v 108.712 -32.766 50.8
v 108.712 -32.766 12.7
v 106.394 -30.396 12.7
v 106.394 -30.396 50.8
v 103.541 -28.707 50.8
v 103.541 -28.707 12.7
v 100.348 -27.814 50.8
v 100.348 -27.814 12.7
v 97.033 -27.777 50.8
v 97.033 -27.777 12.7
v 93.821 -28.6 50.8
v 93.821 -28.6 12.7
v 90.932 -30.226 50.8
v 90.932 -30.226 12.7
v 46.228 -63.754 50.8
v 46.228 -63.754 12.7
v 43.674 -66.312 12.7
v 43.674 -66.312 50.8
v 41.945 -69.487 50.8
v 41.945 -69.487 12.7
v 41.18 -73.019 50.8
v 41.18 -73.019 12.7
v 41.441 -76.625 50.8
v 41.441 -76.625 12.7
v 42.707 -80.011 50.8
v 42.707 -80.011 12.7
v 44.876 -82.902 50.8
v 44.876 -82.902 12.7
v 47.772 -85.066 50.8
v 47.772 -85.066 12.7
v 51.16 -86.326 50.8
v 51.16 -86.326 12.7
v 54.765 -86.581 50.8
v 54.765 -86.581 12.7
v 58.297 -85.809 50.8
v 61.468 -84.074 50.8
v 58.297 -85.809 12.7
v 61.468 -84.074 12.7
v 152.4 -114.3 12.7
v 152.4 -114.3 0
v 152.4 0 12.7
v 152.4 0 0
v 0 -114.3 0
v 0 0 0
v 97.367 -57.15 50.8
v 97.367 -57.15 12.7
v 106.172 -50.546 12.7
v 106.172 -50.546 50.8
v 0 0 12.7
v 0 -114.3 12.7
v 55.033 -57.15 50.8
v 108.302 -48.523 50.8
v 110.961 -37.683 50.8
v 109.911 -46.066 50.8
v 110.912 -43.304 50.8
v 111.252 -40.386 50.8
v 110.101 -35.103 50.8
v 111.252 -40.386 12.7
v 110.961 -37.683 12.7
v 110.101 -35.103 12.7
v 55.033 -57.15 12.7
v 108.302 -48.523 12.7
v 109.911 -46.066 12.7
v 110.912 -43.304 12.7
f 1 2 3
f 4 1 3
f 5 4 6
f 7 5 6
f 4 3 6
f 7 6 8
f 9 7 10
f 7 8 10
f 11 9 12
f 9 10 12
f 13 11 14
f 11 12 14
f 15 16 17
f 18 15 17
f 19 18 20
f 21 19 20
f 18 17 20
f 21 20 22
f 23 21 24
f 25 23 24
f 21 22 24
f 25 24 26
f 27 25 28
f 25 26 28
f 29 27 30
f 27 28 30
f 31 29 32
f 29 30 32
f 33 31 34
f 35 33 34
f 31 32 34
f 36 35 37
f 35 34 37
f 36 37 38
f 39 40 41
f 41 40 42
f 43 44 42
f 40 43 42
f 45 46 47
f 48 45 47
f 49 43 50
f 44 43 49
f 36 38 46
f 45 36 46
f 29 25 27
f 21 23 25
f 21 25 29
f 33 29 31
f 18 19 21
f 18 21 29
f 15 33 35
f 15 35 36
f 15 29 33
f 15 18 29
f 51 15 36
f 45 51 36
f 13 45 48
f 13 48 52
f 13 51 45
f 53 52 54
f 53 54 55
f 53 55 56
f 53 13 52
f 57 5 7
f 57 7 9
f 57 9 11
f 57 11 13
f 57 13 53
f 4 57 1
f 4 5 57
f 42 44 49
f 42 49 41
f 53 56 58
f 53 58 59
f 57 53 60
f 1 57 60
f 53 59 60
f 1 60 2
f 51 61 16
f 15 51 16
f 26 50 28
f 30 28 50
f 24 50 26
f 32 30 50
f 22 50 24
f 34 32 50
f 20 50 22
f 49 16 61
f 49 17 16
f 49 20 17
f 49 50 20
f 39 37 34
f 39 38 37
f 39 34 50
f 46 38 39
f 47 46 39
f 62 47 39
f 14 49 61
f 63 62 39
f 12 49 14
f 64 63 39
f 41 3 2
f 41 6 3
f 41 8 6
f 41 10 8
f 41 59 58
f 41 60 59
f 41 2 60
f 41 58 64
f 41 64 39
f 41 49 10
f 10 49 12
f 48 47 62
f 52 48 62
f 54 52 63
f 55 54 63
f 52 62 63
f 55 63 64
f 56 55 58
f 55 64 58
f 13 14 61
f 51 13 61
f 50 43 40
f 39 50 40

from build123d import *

# Parameters (mm, degrees)
F0_W     = 152.4
F0_H     = 114.3
F1_DEPTH = 12.7
F3_DEPTH = 38.1


with BuildPart() as f1:
    # F0 (on Top) → F1 (new body)
    with BuildSketch(Plane.XY):
        with Locations((76.2, -57.15)):
            Rectangle(F0_W, F0_H)
    extrude(amount=F1_DEPTH)

    # F2 (on face) → F3 (join)
    with BuildSketch(Plane.XY.offset(12.7)):
        Polygon((76.2, -41.275), (55.0333333333, -57.15), (76.2, -57.15), align=None)
        with BuildLine():
            Line((76.2, -57.15), (55.0333333333, -57.15))
            Line((55.0333333333, -57.15), (46.228, -63.754))
            ThreePointArc((46.228, -63.754), (55.6440512242, -61.3416414305), (64.008, -66.294))
            Line((64.008, -66.294), (76.2, -57.15))
        make_face()
        with BuildLine():
            Line((88.392, -48.006), (76.2, -57.15))
            Line((76.2, -57.15), (97.3666666667, -57.15))
            Line((97.3666666667, -57.15), (106.172, -50.546))
            ThreePointArc((106.172, -50.546), (96.7559487758, -52.9583585695), (88.392, -48.006))
        make_face()
        Polygon((97.3666666667, -57.15), (76.2, -57.15), (76.2, -73.025), align=None)
        with BuildLine():
            Line((76.2, -41.275), (76.2, -57.15))
            Line((76.2, -57.15), (88.392, -48.006))
            ThreePointArc((88.392, -48.006), (85.9796414305, -38.5899487758), (90.932, -30.226))
            Line((90.932, -30.226), (76.2, -41.275))
        make_face()
        with BuildLine():
            Line((76.2, -73.025), (76.2, -57.15))
            Line((76.2, -57.15), (64.008, -66.294))
            ThreePointArc((64.008, -66.294), (65.8962778852, -69.8979073716), (66.548, -73.914))
            ThreePointArc((66.548, -73.914), (65.2072253257, -79.5936126628), (61.468, -84.074))
            Line((61.468, -84.074), (76.2, -73.025))
        make_face()
        with BuildLine():
            ThreePointArc((64.008, -66.294), (55.6440512242, -61.3416414305), (46.228, -63.754))
            Line((46.228, -63.754), (53.848, -73.914))
            Line((53.848, -73.914), (64.008, -66.294))
        make_face()
        with BuildLine():
            Line((53.848, -73.914), (46.228, -63.754))
            ThreePointArc((46.228, -63.754), (41.2756414305, -72.1179487758), (43.688, -81.534))
            Line((43.688, -81.534), (53.848, -73.914))
        make_face()
        with BuildLine():
            ThreePointArc((90.932, -30.226), (85.9796414305, -38.5899487758), (88.392, -48.006))
            Line((88.392, -48.006), (98.552, -40.386))
            Line((98.552, -40.386), (90.932, -30.226))
        make_face()
        with BuildLine():
            Line((98.552, -40.386), (88.392, -48.006))
            ThreePointArc((88.392, -48.006), (96.7559487758, -52.9583585695), (106.172, -50.546))
            Line((106.172, -50.546), (98.552, -40.386))
        make_face()
        with BuildLine():
            ThreePointArc((66.548, -73.914), (65.8962778852, -69.8979073716), (64.008, -66.294))
            Line((64.008, -66.294), (53.848, -73.914))
            Line((53.848, -73.914), (61.468, -84.074))
            ThreePointArc((61.468, -84.074), (65.2072253257, -79.5936126628), (66.548, -73.914))
        make_face()
        with BuildLine():
            ThreePointArc((108.712, -32.766), (100.3480512242, -27.8136414305), (90.932, -30.226))
            Line((90.932, -30.226), (98.552, -40.386))
            Line((98.552, -40.386), (108.712, -32.766))
        make_face()
        with BuildLine():
            Line((61.468, -84.074), (53.848, -73.914))
            Line((53.848, -73.914), (43.688, -81.534))
            ThreePointArc((43.688, -81.534), (52.0519487758, -86.4863585695), (61.468, -84.074))
        make_face()
        with BuildLine():
            Line((98.552, -40.386), (106.172, -50.546))
            ThreePointArc((106.172, -50.546), (109.9112253257, -46.0656126628), (111.252, -40.386))
            ThreePointArc((111.252, -40.386), (110.6002778852, -36.3699073716), (108.712, -32.766))
            Line((108.712, -32.766), (98.552, -40.386))
        make_face()
    extrude(amount=F3_DEPTH)


solid = f1.part
